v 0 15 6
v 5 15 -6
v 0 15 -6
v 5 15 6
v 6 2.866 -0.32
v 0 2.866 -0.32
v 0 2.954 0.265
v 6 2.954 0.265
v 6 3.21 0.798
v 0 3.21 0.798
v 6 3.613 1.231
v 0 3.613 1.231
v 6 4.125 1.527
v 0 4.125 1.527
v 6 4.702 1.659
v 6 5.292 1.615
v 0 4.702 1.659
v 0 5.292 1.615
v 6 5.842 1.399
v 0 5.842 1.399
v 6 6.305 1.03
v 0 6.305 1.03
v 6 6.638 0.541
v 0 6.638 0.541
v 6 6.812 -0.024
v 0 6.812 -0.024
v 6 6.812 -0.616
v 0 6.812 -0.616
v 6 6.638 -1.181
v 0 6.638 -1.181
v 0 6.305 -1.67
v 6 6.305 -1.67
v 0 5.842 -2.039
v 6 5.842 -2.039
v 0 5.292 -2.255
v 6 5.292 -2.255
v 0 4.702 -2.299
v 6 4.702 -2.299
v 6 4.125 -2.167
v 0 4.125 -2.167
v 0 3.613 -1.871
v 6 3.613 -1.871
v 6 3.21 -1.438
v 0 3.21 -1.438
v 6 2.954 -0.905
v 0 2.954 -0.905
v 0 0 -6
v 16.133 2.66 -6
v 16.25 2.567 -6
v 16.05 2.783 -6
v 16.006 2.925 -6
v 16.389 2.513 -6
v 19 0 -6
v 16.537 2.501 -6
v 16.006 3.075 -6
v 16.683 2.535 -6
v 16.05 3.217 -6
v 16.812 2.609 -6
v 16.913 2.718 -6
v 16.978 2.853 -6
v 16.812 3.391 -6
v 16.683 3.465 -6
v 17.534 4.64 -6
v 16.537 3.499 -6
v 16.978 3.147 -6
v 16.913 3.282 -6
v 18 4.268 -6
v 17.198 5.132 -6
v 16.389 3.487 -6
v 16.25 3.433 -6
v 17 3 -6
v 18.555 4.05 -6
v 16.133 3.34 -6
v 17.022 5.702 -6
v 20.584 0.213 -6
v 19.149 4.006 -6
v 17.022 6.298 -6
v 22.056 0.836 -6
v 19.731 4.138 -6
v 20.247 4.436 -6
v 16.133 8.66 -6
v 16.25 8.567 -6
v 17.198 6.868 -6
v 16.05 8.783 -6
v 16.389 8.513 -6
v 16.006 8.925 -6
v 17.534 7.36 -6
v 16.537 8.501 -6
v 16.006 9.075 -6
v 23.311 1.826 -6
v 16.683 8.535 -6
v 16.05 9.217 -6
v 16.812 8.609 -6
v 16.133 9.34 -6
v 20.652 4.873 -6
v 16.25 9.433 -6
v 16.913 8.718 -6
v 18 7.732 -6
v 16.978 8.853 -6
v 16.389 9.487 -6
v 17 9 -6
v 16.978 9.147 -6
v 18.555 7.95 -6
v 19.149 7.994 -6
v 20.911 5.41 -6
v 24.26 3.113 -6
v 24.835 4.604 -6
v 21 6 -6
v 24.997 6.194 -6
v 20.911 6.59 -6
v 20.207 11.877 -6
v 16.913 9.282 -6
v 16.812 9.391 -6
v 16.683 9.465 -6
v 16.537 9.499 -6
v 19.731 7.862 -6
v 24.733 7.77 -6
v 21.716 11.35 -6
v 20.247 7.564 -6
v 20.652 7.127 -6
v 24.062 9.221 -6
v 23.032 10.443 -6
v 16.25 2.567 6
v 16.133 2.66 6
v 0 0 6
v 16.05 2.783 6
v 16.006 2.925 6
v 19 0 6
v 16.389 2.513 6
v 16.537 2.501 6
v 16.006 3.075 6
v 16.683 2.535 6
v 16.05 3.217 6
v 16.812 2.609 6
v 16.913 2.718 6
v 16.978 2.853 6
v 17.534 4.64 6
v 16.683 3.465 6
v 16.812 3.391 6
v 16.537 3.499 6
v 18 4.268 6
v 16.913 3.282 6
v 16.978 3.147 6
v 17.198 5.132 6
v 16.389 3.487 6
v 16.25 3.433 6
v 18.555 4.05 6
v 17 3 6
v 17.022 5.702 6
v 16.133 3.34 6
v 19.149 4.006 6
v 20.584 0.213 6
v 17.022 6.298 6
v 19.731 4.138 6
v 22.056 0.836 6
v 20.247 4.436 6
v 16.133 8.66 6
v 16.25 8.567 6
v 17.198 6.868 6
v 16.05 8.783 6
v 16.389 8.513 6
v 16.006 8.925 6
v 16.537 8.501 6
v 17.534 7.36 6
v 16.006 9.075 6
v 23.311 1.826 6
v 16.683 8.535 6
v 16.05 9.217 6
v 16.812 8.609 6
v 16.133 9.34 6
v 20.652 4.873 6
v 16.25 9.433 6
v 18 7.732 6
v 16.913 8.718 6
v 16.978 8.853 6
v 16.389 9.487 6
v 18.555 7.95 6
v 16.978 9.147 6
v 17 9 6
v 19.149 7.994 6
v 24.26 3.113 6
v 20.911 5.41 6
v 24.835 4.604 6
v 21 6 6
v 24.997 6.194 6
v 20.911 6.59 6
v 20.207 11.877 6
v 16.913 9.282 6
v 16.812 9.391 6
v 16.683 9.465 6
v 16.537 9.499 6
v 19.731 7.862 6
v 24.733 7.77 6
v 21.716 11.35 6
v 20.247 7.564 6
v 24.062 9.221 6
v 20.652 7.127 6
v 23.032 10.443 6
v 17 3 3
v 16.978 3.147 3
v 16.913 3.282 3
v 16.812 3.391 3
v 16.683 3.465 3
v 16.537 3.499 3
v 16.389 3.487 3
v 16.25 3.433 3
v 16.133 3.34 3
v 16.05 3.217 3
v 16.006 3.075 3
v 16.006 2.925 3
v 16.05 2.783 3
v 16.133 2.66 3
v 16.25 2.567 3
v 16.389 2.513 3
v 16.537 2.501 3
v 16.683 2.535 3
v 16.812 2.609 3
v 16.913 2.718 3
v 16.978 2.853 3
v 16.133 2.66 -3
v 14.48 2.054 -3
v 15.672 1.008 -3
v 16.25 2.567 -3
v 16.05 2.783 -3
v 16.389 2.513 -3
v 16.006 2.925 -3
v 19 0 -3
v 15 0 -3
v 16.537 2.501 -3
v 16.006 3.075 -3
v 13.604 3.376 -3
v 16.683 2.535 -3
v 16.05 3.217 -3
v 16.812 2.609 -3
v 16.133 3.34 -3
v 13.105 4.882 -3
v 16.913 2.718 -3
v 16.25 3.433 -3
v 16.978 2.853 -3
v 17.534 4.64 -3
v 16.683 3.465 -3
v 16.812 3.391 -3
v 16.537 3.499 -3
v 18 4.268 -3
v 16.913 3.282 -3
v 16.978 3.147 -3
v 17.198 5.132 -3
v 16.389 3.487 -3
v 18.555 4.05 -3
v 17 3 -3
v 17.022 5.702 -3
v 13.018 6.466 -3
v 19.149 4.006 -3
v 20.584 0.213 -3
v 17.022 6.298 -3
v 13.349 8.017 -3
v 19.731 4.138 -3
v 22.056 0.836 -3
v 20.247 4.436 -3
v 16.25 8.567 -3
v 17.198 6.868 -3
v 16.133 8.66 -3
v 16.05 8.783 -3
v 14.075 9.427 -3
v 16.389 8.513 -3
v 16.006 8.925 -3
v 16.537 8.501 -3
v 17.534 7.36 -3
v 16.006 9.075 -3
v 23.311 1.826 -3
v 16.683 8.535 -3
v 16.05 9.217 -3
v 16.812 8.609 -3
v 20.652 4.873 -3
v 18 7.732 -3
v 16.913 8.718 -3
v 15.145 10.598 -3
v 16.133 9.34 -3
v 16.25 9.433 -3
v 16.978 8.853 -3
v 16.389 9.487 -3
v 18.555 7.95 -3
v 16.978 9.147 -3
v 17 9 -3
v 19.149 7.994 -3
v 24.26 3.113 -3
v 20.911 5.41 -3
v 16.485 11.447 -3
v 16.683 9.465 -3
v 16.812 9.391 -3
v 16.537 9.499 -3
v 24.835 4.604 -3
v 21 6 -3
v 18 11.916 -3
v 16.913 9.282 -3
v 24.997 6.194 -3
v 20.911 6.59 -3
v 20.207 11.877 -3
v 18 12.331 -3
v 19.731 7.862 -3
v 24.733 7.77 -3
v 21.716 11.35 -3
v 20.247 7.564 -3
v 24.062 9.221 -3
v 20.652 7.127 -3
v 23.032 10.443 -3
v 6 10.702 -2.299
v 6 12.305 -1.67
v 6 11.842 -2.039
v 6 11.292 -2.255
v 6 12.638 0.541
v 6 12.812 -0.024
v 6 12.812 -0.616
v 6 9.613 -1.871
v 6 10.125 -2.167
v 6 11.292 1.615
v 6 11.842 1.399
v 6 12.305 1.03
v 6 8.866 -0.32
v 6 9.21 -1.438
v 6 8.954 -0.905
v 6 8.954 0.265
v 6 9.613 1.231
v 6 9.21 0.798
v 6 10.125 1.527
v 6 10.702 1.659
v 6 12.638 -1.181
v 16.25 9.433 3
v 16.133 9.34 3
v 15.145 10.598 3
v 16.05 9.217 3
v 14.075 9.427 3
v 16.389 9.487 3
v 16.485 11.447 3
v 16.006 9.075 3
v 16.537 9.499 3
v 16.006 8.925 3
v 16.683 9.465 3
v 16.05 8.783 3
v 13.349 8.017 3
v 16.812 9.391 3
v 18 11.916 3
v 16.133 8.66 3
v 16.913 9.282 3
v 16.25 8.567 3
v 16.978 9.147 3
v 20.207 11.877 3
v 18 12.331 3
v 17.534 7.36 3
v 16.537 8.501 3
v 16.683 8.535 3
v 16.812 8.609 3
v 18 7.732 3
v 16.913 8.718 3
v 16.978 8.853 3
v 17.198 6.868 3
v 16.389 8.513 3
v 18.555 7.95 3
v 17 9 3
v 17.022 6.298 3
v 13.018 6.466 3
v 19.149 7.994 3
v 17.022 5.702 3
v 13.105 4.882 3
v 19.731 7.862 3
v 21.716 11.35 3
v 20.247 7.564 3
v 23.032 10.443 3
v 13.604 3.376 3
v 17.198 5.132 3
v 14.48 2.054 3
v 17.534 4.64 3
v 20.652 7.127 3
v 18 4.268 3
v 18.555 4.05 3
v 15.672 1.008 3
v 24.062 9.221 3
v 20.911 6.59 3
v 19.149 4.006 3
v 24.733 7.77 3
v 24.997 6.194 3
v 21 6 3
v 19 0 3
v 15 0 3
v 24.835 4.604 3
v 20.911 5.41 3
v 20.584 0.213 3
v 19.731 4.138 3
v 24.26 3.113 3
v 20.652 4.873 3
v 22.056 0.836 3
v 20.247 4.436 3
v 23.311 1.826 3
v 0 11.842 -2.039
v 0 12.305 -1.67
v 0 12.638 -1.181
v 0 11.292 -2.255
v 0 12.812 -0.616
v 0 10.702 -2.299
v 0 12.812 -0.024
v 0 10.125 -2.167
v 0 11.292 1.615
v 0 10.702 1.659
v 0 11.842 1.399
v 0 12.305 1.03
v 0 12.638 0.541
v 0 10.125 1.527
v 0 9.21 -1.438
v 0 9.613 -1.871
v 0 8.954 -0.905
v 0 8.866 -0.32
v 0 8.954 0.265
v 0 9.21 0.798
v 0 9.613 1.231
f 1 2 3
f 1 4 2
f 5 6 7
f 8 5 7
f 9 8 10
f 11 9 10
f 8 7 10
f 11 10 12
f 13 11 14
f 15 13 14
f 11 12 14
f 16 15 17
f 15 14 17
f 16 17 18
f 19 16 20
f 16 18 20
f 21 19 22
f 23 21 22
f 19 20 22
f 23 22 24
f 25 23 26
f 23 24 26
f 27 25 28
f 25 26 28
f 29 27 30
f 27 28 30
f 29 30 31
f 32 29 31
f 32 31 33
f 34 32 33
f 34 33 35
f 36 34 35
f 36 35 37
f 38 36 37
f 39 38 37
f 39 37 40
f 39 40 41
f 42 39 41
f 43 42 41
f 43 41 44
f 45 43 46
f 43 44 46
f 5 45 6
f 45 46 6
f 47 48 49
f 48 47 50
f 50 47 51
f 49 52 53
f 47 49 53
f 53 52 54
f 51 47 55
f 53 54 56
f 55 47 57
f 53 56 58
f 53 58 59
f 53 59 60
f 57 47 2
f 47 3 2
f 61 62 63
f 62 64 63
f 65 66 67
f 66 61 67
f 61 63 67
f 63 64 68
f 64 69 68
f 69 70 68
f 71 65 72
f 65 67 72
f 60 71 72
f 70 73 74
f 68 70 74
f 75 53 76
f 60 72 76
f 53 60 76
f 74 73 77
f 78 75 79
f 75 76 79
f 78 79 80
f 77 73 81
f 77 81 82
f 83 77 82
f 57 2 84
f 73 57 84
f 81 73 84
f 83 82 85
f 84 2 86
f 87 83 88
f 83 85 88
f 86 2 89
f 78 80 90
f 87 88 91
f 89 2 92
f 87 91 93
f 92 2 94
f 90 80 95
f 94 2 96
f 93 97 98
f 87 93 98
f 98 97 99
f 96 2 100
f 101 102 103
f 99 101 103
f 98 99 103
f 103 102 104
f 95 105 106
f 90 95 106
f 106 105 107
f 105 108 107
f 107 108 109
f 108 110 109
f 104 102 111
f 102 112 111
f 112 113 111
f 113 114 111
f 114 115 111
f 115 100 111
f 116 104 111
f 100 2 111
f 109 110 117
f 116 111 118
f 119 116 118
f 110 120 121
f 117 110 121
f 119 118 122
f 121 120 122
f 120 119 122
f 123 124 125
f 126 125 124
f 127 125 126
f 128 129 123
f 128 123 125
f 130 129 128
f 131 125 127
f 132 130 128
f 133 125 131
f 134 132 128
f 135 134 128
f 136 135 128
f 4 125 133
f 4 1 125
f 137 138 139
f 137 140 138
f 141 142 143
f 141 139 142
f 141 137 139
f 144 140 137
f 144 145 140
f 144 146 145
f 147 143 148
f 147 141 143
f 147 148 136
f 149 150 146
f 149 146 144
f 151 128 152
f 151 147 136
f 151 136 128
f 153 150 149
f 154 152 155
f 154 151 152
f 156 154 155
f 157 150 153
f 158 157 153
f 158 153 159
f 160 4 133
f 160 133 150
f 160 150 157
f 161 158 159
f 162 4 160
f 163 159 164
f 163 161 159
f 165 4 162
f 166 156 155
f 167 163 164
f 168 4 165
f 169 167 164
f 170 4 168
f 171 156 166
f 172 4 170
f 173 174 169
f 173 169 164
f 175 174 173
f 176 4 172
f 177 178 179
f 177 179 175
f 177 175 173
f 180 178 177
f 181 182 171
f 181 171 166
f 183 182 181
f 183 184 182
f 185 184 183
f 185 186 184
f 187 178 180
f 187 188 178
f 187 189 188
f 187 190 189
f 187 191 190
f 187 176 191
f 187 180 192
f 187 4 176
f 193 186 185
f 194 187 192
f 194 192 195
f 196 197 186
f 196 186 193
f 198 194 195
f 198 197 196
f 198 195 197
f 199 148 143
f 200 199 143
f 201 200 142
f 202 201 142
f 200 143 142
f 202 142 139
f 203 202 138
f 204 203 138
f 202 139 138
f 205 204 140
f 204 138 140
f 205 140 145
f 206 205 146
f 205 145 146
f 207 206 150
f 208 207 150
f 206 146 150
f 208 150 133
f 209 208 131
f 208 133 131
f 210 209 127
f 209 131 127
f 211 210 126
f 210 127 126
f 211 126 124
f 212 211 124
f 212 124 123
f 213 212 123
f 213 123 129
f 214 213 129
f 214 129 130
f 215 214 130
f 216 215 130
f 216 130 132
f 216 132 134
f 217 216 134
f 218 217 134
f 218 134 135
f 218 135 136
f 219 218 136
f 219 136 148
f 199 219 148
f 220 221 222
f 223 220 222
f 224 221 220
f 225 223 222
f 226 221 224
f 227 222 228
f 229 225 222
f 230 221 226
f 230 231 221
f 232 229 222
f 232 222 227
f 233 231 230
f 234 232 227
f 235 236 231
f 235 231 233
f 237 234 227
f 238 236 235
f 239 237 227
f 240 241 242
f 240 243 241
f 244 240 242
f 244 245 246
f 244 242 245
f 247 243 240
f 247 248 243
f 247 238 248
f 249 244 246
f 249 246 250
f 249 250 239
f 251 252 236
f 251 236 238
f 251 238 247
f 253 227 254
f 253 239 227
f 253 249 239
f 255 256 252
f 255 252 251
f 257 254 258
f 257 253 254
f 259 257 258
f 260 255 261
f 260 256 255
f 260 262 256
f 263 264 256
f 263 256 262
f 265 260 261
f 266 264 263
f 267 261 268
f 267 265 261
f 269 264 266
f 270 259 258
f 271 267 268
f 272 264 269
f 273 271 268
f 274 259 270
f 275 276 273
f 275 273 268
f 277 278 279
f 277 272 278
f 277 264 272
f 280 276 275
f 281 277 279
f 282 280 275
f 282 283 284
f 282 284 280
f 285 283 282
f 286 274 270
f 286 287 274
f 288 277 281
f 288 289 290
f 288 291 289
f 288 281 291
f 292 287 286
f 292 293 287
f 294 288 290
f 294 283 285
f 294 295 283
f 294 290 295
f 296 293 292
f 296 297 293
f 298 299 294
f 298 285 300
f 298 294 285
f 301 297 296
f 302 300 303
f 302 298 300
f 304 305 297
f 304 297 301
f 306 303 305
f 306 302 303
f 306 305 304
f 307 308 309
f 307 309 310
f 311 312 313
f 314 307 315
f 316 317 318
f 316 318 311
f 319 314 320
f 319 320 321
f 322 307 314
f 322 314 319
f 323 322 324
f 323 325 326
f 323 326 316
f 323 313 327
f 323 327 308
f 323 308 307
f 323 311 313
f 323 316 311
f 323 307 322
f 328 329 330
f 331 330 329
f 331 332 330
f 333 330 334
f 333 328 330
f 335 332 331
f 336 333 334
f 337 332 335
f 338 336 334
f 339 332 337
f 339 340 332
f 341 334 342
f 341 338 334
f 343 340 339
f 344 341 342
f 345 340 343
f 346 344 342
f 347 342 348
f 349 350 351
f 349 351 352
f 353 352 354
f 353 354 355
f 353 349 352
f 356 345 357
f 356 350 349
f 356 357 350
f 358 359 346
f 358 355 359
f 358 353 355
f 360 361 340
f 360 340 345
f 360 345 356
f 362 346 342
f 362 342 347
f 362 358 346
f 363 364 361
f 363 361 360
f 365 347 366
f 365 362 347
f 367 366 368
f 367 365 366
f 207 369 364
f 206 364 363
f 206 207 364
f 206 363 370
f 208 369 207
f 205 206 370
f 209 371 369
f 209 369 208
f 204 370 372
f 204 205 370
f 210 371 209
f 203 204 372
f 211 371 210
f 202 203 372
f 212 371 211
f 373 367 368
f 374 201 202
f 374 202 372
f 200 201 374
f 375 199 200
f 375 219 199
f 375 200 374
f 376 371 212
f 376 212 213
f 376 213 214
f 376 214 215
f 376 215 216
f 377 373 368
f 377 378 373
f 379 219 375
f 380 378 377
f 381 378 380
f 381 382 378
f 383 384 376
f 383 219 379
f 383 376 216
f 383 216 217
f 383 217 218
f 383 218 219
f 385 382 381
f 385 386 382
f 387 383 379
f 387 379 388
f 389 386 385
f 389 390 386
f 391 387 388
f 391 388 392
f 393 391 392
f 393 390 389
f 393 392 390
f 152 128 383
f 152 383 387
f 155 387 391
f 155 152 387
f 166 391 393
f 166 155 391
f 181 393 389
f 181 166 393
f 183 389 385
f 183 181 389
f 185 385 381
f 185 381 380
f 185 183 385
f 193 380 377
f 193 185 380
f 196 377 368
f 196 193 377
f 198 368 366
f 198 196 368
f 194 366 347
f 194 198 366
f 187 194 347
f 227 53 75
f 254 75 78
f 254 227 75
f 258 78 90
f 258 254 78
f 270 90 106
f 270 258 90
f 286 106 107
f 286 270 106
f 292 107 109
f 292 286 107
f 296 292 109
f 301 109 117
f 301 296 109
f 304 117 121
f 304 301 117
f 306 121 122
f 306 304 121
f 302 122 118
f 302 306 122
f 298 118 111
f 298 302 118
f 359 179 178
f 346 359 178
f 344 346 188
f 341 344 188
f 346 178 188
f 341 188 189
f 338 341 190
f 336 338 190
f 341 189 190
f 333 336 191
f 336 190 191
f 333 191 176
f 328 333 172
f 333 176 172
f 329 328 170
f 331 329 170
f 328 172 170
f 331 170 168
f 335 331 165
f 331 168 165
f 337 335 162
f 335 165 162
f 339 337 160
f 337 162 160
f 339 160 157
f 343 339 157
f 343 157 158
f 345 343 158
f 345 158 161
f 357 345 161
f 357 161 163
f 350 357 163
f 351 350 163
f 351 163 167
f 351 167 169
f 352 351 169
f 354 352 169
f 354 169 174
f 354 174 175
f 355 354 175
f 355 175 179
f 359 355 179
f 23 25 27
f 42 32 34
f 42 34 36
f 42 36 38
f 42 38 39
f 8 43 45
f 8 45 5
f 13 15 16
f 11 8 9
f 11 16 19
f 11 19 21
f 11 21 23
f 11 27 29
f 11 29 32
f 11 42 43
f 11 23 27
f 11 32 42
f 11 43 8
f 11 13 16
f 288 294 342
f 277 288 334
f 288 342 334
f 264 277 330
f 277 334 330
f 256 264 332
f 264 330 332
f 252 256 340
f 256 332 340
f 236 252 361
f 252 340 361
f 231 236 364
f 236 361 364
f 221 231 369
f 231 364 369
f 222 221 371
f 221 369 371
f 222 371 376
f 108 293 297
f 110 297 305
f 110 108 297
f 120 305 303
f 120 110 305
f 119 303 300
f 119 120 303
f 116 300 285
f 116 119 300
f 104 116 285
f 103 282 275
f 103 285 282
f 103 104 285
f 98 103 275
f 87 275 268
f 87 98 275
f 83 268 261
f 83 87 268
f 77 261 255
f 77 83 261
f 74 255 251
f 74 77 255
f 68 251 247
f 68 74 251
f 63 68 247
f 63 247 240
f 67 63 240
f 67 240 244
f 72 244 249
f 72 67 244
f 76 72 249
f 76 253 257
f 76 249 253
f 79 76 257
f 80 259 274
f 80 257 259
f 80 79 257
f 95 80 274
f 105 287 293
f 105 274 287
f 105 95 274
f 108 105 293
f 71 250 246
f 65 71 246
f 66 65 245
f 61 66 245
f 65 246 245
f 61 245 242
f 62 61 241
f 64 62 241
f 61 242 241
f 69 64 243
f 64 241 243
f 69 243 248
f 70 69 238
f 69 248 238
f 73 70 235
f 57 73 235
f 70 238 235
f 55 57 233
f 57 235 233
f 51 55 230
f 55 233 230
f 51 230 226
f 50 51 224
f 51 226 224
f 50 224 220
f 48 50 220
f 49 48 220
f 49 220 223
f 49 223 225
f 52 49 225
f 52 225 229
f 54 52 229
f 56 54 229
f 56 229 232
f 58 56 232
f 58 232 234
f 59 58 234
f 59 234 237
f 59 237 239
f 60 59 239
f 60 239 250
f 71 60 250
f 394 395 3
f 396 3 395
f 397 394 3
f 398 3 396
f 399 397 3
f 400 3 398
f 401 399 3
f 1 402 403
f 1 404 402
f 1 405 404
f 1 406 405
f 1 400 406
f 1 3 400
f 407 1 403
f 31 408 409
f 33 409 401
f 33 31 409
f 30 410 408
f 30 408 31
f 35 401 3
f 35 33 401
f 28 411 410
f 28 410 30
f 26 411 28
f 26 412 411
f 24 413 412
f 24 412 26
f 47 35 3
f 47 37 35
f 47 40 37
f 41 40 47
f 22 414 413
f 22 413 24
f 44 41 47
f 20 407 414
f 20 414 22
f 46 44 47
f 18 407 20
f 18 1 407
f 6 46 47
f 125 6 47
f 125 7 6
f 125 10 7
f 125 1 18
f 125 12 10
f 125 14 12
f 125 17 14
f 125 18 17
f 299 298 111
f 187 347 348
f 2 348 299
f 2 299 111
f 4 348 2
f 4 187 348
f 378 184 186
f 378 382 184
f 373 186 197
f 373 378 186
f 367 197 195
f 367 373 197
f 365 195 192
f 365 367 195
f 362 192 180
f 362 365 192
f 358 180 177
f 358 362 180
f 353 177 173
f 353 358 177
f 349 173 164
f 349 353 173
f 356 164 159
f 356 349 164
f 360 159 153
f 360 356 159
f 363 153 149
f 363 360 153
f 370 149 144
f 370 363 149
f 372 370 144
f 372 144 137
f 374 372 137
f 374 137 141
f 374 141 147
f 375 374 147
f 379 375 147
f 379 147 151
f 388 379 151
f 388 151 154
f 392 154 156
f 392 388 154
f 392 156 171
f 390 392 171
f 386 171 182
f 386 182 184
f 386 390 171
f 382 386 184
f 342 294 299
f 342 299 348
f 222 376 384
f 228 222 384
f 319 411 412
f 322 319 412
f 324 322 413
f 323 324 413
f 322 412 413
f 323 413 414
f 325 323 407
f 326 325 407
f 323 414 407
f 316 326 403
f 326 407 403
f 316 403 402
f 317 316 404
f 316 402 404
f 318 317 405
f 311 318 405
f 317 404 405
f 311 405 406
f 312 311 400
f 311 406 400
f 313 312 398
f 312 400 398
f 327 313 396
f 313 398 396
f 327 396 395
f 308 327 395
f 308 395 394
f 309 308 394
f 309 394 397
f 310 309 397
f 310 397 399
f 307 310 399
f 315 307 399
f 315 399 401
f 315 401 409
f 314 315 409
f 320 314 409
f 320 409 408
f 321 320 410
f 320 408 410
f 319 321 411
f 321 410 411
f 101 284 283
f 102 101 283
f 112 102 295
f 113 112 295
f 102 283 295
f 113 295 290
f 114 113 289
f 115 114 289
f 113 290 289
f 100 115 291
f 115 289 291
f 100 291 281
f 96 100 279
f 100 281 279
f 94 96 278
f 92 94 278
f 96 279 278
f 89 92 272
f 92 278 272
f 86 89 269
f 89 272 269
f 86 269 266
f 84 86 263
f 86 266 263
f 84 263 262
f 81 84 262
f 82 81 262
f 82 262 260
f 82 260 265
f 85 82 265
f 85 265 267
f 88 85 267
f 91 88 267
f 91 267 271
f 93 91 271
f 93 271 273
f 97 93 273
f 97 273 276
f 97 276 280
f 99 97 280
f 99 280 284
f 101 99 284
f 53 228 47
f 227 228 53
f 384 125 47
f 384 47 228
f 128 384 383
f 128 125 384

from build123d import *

# Parameters (mm, degrees)
SKETCH1_R           = 2
BOSS_EXTRUDE1_DEPTH = 6
CUT_EXTRUDE1_DEPTH  = 3
SKETCH7_R           = 1.984375
CUT_EXTRUDE3_DEPTH  = 6
SKETCH16_W          = 15.013819635
SKETCH16_H          = 6
CUT_EXTRUDE7_DEPTH  = 30.765752132
SKETCH19_R          = 0.5
CUT_EXTRUDE10_DEPTH = 32.527765541
CUT_EXTRUDE13_DEPTH = 3


with BuildPart() as part:
    # Sketch1 → Boss-Extrude1 (new, symmetric)
    with BuildSketch(Plane.XY):
        with BuildLine():
            Line((0, 0), (19, 0))
            ThreePointArc((19, 0), (24.969263034, 5.393453355), (20.206878822, 11.877367056))
            Line((20.206878822, 11.877367056), (5, 15))
            Line((5, 15), (0, 15))
            Line((0, 15), (0, 0))
        make_face()
        with Locations((19, 6)):
            Circle(SKETCH1_R, mode=Mode.SUBTRACT)
    extrude(amount=BOSS_EXTRUDE1_DEPTH, both=True)

    # Sketch2 → Cut-Extrude1 (cut, symmetric)
    with BuildSketch(Plane.XY):
        with BuildLine():
            ThreePointArc((19, 0), (25, 6), (19, 12))
            ThreePointArc((19, 12), (13, 6), (19, 0))
        make_face()
    extrude(amount=CUT_EXTRUDE1_DEPTH, both=True, mode=Mode.SUBTRACT)

    # Sketch7 → Cut-Extrude3 (cut)
    with BuildSketch(Plane.ZY):
        with Locations((-0.32, 10.85)):
            Circle(SKETCH7_R)
        with Locations((-0.32, 4.85)):
            Circle(SKETCH7_R)
    extrude(amount=-CUT_EXTRUDE3_DEPTH, mode=Mode.SUBTRACT)

    # Sketch16 → Cut-Extrude7 (cut, through all)
    with BuildSketch(Plane.XZ):
        with Locations((25.506909818, 0)):
            Rectangle(SKETCH16_W, SKETCH16_H)
    extrude(amount=-CUT_EXTRUDE7_DEPTH, mode=Mode.SUBTRACT)

    # Sketch19 → Cut-Extrude10 (cut, through all)
    with BuildSketch(Plane.XY.offset(6)):
        with Locations((16.5, 3)):
            Circle(SKETCH19_R)
        with Locations((16.5, 9)):
            Circle(SKETCH19_R)
    extrude(amount=-CUT_EXTRUDE10_DEPTH, mode=Mode.SUBTRACT)

    # Sketch23 → Cut-Extrude13 (cut, symmetric)
    with BuildSketch(Plane.XY):
        Polygon((18, 0), (18, 1.5), (16, 1.5), (15, 0), align=None)
    extrude(amount=CUT_EXTRUDE13_DEPTH, both=True, mode=Mode.SUBTRACT)


solid = part.part
